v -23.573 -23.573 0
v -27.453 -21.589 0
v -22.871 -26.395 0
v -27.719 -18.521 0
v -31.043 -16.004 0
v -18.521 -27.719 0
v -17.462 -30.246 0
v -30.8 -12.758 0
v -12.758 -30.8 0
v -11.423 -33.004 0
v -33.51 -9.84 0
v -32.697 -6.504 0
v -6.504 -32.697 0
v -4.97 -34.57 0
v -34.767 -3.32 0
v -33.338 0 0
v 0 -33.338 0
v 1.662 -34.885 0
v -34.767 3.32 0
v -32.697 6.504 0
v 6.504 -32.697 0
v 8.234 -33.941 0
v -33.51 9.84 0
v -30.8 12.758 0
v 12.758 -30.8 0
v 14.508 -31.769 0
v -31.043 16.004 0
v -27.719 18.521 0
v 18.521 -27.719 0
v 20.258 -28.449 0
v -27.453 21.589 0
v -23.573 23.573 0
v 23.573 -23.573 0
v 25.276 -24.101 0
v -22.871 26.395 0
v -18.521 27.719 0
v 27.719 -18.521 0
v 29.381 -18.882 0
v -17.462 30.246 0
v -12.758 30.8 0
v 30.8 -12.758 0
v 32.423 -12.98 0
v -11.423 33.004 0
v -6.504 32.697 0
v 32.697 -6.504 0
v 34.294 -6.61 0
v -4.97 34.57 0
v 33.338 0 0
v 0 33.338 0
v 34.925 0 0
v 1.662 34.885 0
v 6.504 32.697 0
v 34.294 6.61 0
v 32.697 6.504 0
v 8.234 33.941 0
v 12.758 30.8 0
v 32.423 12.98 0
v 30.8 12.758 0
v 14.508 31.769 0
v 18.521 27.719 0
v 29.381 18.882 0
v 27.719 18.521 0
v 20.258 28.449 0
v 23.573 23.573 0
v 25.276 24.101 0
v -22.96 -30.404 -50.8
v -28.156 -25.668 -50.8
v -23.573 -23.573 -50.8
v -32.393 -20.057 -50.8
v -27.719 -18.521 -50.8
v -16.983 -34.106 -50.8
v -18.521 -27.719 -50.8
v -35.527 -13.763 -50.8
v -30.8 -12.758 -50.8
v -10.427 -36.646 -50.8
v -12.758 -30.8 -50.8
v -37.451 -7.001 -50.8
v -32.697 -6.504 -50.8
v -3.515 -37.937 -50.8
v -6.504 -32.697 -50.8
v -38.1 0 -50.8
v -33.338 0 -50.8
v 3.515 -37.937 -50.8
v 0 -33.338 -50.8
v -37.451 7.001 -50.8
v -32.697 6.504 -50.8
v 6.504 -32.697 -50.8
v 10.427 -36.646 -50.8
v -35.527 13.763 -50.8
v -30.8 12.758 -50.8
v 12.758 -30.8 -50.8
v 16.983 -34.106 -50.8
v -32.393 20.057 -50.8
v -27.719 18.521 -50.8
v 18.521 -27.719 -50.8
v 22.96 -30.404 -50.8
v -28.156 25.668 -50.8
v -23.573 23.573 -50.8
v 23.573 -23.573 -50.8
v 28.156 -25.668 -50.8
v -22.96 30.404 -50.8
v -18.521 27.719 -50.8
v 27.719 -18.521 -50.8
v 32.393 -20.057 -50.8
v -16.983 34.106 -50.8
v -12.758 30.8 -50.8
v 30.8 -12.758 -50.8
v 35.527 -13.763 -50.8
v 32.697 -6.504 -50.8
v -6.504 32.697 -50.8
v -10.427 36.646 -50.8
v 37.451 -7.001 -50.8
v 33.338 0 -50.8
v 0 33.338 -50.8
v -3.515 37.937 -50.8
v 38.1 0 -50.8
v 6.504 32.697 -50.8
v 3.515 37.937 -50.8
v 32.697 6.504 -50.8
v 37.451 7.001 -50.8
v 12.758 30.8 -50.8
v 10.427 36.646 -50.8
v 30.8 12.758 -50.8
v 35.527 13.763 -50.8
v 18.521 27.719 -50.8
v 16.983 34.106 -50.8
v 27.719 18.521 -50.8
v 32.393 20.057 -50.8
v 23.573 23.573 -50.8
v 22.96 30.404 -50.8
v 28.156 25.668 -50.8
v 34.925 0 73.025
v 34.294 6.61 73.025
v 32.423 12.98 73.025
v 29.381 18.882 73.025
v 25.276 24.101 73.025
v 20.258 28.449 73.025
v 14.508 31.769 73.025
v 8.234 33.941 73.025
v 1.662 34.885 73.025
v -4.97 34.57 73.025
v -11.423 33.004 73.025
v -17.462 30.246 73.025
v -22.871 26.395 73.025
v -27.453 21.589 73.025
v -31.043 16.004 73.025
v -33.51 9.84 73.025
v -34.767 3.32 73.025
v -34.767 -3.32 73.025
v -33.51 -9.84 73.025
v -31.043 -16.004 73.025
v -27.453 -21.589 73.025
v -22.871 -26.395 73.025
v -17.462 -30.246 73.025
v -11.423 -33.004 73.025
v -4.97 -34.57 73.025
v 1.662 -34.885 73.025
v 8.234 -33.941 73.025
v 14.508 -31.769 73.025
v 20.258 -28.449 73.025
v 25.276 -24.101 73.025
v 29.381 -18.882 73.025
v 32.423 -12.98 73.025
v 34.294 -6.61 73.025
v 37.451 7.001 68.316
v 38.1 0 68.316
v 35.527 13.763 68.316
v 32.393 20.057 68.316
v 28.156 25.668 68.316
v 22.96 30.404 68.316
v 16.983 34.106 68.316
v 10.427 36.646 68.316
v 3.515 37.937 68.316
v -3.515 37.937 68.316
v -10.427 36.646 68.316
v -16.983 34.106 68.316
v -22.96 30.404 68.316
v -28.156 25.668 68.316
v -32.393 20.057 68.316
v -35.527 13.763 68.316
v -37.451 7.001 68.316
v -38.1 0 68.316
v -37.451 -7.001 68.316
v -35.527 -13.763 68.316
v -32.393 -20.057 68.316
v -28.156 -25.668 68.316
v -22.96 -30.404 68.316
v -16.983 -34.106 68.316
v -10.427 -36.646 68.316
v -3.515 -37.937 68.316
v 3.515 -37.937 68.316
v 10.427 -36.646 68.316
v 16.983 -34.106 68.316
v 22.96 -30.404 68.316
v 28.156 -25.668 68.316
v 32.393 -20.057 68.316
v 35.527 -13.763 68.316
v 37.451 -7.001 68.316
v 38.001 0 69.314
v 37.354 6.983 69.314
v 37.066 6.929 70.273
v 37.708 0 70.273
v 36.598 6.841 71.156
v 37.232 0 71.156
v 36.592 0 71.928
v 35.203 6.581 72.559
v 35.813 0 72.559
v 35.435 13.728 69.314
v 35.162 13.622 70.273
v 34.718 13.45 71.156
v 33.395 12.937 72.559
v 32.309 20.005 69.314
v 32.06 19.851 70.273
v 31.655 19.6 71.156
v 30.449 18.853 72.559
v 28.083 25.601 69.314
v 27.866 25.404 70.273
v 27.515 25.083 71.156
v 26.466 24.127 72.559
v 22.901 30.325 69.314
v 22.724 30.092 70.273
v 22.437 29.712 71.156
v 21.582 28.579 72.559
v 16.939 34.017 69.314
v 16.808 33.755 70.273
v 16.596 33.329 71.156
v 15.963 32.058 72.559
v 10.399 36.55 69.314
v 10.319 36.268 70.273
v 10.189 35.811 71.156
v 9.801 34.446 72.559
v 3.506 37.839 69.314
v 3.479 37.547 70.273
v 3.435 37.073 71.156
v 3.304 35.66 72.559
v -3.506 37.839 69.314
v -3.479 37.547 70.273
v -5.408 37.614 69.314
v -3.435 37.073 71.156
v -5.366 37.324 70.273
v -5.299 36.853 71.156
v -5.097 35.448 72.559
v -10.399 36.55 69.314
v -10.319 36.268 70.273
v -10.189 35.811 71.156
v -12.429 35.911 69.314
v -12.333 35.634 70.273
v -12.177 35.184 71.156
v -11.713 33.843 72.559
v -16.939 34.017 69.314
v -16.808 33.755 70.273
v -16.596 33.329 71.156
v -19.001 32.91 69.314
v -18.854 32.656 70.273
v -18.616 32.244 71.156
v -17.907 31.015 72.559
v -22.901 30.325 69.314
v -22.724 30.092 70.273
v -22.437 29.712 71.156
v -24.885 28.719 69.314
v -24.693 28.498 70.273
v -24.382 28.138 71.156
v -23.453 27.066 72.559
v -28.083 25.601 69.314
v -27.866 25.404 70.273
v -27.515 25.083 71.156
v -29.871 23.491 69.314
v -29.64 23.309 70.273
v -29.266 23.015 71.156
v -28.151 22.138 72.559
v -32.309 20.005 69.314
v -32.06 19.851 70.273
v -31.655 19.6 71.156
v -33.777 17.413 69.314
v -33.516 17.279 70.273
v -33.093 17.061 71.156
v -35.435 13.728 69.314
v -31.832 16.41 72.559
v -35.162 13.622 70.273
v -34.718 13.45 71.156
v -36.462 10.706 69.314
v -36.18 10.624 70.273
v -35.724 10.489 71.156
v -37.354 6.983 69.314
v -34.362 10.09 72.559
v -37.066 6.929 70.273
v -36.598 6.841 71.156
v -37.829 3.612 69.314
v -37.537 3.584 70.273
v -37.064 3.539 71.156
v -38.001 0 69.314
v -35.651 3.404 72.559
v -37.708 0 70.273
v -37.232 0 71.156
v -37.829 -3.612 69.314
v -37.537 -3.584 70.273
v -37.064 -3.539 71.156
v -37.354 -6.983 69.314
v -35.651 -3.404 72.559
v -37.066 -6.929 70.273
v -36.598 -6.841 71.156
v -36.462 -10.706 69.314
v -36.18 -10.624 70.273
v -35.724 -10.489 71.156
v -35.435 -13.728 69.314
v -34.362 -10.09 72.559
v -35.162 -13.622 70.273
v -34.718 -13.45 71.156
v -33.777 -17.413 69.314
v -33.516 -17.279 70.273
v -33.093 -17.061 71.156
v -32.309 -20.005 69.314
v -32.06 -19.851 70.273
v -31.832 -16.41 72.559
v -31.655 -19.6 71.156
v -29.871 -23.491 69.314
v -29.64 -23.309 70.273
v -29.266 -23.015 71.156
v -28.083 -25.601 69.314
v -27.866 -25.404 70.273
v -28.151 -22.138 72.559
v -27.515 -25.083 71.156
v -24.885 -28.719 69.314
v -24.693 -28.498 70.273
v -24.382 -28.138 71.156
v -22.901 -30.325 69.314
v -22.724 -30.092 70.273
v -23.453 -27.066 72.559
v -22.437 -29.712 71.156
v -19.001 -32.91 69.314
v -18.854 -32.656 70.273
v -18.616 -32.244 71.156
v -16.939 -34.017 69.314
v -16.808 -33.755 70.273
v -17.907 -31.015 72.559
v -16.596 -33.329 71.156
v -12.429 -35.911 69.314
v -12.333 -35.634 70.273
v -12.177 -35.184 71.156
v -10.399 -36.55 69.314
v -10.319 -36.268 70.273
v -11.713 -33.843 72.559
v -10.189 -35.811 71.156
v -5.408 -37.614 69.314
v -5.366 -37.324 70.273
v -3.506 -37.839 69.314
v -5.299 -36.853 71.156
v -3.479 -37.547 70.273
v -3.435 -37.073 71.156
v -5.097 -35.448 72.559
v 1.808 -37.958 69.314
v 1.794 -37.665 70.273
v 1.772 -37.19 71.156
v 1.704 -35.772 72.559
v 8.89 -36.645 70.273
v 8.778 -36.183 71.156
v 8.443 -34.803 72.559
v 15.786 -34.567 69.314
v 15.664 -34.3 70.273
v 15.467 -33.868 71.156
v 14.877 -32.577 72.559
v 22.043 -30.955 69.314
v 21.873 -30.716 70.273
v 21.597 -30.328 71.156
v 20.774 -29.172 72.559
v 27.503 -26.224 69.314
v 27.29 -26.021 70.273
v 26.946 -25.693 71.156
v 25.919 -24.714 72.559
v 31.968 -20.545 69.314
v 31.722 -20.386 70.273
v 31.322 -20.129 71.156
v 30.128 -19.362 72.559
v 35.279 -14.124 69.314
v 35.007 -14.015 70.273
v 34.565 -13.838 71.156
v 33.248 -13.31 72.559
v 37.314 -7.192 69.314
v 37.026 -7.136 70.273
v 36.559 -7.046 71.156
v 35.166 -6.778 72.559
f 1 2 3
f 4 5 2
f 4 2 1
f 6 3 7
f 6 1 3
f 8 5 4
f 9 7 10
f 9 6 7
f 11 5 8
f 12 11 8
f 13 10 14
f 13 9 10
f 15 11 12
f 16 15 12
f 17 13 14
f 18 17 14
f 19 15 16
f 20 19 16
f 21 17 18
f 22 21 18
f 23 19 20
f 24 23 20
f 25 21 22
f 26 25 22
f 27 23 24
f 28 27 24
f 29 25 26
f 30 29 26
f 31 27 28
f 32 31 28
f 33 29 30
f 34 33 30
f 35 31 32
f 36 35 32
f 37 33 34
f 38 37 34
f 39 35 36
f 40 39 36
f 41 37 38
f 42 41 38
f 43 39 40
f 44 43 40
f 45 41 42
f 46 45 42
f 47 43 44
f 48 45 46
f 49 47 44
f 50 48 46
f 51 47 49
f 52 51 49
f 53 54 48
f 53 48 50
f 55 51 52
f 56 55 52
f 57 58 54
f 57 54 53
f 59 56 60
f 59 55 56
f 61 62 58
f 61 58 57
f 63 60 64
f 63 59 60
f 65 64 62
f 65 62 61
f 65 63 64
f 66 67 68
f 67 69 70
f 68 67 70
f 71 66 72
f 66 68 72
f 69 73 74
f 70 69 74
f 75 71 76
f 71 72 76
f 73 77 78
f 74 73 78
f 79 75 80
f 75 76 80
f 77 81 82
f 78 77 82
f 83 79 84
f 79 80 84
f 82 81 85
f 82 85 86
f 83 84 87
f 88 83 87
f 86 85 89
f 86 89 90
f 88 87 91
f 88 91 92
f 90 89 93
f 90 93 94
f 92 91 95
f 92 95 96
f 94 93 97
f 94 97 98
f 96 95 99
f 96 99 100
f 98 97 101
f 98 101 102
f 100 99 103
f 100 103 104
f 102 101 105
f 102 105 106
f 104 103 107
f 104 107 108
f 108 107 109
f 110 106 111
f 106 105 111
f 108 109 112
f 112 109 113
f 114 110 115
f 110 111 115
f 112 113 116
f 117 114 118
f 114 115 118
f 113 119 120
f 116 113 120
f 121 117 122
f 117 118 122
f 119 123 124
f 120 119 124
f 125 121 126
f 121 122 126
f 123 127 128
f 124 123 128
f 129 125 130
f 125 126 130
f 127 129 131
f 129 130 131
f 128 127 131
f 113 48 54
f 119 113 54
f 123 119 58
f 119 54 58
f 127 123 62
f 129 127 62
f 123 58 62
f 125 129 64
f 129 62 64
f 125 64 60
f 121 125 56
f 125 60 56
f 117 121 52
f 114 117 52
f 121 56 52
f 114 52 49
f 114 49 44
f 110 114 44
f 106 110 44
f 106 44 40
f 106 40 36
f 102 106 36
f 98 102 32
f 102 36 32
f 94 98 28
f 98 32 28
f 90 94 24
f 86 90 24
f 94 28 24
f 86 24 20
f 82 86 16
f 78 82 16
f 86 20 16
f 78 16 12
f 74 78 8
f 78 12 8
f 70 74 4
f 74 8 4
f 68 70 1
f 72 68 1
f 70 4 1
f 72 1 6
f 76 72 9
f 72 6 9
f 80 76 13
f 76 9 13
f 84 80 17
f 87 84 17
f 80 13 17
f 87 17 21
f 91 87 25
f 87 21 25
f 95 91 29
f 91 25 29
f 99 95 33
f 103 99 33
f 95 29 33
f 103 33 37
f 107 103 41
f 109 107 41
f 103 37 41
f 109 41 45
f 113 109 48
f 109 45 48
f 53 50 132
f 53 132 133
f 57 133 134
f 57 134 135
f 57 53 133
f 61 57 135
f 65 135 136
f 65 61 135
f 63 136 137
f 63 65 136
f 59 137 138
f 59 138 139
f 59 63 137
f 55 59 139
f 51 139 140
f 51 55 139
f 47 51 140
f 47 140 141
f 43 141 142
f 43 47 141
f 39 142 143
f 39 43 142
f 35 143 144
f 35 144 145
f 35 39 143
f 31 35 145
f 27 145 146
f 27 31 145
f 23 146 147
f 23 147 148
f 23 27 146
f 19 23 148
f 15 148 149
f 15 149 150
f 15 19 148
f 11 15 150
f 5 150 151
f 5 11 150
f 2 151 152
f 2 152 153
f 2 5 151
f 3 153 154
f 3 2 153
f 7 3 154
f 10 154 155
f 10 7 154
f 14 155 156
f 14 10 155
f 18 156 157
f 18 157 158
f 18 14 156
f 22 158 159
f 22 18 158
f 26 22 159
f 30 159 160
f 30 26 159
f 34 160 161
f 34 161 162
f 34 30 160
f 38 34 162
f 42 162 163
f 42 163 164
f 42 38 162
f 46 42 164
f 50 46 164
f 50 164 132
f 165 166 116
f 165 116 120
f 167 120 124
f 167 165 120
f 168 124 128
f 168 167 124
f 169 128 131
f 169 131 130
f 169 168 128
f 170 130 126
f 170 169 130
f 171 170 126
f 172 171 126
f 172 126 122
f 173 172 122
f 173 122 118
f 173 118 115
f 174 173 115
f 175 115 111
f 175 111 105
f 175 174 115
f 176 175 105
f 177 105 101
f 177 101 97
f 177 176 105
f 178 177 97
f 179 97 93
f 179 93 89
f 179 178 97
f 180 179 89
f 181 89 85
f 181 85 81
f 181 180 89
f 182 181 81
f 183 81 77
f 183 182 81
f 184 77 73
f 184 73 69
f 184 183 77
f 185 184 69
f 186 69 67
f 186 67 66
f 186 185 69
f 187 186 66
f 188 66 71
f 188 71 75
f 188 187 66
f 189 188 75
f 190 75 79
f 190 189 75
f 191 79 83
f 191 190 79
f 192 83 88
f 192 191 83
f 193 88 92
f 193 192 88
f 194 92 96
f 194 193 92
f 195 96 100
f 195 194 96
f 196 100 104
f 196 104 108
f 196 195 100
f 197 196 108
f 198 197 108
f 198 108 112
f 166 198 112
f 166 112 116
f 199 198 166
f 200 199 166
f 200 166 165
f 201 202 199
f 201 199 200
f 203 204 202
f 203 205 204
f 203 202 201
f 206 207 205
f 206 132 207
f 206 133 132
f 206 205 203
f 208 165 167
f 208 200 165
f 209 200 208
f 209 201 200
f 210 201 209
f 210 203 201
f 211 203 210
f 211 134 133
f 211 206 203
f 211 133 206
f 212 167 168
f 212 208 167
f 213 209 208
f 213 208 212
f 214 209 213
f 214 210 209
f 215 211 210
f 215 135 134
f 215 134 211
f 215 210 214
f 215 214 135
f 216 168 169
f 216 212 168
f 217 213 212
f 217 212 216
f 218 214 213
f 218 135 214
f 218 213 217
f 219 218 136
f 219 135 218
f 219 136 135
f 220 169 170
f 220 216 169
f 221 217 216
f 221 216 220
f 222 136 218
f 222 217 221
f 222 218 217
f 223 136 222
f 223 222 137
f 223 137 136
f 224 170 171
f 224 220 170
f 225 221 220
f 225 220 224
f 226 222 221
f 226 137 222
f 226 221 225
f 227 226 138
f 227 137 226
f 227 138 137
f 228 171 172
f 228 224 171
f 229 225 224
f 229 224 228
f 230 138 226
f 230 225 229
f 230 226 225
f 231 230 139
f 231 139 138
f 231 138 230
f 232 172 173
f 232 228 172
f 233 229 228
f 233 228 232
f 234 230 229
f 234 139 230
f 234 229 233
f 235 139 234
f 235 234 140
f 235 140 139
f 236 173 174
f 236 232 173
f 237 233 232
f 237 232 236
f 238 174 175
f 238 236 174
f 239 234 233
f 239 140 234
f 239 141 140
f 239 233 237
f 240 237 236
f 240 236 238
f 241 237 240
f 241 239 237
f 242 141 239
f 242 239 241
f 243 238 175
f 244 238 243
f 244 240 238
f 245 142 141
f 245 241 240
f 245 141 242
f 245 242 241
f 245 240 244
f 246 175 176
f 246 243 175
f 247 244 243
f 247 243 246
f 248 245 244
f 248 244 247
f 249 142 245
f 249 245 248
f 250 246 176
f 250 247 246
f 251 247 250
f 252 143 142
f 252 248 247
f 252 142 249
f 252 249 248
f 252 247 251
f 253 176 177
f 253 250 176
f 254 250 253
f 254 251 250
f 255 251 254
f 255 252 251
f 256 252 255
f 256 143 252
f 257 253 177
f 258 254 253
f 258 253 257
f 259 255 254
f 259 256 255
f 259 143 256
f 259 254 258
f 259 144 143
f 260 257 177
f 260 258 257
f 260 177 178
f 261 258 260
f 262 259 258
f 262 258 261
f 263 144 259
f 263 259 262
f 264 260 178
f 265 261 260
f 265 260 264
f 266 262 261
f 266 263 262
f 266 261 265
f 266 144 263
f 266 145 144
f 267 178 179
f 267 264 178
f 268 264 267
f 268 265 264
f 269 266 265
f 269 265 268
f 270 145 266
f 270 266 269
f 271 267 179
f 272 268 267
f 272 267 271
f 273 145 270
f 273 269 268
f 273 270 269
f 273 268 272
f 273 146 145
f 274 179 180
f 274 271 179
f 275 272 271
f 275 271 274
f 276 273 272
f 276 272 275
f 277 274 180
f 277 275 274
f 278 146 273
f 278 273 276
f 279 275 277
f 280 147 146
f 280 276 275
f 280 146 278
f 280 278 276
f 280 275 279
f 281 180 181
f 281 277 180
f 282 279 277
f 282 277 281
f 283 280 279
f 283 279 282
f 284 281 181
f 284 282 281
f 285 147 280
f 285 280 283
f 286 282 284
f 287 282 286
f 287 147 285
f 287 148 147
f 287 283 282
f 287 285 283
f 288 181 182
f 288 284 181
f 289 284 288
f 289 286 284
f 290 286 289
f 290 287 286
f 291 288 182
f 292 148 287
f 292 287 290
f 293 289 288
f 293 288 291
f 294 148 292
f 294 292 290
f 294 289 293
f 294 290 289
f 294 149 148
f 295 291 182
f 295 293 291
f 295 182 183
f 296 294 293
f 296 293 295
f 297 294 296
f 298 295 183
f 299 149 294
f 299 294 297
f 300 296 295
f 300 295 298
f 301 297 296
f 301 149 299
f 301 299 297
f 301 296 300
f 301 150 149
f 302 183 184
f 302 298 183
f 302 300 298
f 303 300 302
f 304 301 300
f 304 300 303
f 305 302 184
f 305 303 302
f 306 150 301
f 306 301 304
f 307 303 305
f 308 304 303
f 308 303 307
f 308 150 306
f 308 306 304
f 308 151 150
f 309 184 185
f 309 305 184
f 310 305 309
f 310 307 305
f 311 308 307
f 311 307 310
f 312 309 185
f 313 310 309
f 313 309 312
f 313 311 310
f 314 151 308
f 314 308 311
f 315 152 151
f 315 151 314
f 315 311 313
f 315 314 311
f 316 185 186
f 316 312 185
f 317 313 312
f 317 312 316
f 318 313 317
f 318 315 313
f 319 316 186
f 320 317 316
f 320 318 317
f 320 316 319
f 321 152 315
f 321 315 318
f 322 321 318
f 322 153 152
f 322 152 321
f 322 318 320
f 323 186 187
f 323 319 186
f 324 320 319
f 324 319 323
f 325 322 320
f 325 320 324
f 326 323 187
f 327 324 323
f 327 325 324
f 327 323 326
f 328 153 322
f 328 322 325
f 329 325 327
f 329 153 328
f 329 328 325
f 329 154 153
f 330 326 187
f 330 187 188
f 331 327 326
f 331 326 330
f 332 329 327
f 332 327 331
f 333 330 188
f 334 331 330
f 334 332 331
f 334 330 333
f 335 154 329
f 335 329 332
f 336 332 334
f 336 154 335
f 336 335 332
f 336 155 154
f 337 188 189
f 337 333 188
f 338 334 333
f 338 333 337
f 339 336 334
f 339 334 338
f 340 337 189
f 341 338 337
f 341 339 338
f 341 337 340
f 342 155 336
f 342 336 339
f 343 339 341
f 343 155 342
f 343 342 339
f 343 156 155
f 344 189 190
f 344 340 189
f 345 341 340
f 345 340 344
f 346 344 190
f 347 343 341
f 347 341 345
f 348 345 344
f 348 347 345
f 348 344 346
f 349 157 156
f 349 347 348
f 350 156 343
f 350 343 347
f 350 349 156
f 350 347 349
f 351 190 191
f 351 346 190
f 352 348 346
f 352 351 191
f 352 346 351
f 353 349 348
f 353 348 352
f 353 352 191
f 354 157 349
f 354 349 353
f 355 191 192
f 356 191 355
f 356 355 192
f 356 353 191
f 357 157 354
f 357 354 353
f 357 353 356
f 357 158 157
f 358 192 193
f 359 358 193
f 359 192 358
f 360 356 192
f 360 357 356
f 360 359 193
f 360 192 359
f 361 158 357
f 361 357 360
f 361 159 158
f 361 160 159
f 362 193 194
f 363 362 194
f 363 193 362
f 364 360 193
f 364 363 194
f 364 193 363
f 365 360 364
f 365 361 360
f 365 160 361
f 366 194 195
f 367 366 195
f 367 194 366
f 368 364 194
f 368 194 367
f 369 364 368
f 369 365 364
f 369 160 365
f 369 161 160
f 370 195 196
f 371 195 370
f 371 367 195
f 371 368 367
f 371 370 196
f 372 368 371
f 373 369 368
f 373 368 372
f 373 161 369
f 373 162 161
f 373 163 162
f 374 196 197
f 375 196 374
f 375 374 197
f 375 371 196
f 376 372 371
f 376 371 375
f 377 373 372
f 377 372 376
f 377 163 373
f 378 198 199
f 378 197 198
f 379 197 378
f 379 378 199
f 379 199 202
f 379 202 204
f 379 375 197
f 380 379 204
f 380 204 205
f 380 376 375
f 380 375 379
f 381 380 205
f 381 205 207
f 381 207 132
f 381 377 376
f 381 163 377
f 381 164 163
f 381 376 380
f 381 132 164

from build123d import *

# Parameters (mm, degrees)
F0_R     = 38.1
F0_R_2   = 34.925
F1_DEPTH = 73.025
F2_R     = 38.1
F2_R_2   = 33.3375
F3_DEPTH = 50.8


# Not quite as in the source:
# - a fillet or chamfer that OpenCascade refuses, or shapes differently, is made with other operations: its cross-section is extruded or revolved along the edge and cut away or added


with BuildPart() as f1:
    # F0 (on Top) → F1 (new body)
    with BuildSketch(Plane.XY):
        Circle(F0_R)
        Circle(F0_R_2, mode=Mode.SUBTRACT)
    extrude(amount=F1_DEPTH)

    # F2 (on Top) → F3 (join)
    with BuildSketch(Plane.XY):
        Circle(F2_R)
        Circle(F2_R_2, mode=Mode.SUBTRACT)
    extrude(amount=-F3_DEPTH)

    # F4: fillet of radius 5.08 on 1 edges, made by hand

    # F4_s1 → F4_t2 (revolve, cut)
    with BuildSketch(Plane.XZ):
        with BuildLine():
            ThreePointArc((38.1, 68.3157139607), (37.2321134838, 71.1555202921), (34.925, 73.025))
            Line((34.925, 73.025), (38.1, 73.025))
            Line((38.1, 73.025), (38.1, 68.3157139607))
        make_face()
    revolve(axis=Axis((0, 0, 73.025), (0, 0, 1)), mode=Mode.SUBTRACT)


solid = f1.part
